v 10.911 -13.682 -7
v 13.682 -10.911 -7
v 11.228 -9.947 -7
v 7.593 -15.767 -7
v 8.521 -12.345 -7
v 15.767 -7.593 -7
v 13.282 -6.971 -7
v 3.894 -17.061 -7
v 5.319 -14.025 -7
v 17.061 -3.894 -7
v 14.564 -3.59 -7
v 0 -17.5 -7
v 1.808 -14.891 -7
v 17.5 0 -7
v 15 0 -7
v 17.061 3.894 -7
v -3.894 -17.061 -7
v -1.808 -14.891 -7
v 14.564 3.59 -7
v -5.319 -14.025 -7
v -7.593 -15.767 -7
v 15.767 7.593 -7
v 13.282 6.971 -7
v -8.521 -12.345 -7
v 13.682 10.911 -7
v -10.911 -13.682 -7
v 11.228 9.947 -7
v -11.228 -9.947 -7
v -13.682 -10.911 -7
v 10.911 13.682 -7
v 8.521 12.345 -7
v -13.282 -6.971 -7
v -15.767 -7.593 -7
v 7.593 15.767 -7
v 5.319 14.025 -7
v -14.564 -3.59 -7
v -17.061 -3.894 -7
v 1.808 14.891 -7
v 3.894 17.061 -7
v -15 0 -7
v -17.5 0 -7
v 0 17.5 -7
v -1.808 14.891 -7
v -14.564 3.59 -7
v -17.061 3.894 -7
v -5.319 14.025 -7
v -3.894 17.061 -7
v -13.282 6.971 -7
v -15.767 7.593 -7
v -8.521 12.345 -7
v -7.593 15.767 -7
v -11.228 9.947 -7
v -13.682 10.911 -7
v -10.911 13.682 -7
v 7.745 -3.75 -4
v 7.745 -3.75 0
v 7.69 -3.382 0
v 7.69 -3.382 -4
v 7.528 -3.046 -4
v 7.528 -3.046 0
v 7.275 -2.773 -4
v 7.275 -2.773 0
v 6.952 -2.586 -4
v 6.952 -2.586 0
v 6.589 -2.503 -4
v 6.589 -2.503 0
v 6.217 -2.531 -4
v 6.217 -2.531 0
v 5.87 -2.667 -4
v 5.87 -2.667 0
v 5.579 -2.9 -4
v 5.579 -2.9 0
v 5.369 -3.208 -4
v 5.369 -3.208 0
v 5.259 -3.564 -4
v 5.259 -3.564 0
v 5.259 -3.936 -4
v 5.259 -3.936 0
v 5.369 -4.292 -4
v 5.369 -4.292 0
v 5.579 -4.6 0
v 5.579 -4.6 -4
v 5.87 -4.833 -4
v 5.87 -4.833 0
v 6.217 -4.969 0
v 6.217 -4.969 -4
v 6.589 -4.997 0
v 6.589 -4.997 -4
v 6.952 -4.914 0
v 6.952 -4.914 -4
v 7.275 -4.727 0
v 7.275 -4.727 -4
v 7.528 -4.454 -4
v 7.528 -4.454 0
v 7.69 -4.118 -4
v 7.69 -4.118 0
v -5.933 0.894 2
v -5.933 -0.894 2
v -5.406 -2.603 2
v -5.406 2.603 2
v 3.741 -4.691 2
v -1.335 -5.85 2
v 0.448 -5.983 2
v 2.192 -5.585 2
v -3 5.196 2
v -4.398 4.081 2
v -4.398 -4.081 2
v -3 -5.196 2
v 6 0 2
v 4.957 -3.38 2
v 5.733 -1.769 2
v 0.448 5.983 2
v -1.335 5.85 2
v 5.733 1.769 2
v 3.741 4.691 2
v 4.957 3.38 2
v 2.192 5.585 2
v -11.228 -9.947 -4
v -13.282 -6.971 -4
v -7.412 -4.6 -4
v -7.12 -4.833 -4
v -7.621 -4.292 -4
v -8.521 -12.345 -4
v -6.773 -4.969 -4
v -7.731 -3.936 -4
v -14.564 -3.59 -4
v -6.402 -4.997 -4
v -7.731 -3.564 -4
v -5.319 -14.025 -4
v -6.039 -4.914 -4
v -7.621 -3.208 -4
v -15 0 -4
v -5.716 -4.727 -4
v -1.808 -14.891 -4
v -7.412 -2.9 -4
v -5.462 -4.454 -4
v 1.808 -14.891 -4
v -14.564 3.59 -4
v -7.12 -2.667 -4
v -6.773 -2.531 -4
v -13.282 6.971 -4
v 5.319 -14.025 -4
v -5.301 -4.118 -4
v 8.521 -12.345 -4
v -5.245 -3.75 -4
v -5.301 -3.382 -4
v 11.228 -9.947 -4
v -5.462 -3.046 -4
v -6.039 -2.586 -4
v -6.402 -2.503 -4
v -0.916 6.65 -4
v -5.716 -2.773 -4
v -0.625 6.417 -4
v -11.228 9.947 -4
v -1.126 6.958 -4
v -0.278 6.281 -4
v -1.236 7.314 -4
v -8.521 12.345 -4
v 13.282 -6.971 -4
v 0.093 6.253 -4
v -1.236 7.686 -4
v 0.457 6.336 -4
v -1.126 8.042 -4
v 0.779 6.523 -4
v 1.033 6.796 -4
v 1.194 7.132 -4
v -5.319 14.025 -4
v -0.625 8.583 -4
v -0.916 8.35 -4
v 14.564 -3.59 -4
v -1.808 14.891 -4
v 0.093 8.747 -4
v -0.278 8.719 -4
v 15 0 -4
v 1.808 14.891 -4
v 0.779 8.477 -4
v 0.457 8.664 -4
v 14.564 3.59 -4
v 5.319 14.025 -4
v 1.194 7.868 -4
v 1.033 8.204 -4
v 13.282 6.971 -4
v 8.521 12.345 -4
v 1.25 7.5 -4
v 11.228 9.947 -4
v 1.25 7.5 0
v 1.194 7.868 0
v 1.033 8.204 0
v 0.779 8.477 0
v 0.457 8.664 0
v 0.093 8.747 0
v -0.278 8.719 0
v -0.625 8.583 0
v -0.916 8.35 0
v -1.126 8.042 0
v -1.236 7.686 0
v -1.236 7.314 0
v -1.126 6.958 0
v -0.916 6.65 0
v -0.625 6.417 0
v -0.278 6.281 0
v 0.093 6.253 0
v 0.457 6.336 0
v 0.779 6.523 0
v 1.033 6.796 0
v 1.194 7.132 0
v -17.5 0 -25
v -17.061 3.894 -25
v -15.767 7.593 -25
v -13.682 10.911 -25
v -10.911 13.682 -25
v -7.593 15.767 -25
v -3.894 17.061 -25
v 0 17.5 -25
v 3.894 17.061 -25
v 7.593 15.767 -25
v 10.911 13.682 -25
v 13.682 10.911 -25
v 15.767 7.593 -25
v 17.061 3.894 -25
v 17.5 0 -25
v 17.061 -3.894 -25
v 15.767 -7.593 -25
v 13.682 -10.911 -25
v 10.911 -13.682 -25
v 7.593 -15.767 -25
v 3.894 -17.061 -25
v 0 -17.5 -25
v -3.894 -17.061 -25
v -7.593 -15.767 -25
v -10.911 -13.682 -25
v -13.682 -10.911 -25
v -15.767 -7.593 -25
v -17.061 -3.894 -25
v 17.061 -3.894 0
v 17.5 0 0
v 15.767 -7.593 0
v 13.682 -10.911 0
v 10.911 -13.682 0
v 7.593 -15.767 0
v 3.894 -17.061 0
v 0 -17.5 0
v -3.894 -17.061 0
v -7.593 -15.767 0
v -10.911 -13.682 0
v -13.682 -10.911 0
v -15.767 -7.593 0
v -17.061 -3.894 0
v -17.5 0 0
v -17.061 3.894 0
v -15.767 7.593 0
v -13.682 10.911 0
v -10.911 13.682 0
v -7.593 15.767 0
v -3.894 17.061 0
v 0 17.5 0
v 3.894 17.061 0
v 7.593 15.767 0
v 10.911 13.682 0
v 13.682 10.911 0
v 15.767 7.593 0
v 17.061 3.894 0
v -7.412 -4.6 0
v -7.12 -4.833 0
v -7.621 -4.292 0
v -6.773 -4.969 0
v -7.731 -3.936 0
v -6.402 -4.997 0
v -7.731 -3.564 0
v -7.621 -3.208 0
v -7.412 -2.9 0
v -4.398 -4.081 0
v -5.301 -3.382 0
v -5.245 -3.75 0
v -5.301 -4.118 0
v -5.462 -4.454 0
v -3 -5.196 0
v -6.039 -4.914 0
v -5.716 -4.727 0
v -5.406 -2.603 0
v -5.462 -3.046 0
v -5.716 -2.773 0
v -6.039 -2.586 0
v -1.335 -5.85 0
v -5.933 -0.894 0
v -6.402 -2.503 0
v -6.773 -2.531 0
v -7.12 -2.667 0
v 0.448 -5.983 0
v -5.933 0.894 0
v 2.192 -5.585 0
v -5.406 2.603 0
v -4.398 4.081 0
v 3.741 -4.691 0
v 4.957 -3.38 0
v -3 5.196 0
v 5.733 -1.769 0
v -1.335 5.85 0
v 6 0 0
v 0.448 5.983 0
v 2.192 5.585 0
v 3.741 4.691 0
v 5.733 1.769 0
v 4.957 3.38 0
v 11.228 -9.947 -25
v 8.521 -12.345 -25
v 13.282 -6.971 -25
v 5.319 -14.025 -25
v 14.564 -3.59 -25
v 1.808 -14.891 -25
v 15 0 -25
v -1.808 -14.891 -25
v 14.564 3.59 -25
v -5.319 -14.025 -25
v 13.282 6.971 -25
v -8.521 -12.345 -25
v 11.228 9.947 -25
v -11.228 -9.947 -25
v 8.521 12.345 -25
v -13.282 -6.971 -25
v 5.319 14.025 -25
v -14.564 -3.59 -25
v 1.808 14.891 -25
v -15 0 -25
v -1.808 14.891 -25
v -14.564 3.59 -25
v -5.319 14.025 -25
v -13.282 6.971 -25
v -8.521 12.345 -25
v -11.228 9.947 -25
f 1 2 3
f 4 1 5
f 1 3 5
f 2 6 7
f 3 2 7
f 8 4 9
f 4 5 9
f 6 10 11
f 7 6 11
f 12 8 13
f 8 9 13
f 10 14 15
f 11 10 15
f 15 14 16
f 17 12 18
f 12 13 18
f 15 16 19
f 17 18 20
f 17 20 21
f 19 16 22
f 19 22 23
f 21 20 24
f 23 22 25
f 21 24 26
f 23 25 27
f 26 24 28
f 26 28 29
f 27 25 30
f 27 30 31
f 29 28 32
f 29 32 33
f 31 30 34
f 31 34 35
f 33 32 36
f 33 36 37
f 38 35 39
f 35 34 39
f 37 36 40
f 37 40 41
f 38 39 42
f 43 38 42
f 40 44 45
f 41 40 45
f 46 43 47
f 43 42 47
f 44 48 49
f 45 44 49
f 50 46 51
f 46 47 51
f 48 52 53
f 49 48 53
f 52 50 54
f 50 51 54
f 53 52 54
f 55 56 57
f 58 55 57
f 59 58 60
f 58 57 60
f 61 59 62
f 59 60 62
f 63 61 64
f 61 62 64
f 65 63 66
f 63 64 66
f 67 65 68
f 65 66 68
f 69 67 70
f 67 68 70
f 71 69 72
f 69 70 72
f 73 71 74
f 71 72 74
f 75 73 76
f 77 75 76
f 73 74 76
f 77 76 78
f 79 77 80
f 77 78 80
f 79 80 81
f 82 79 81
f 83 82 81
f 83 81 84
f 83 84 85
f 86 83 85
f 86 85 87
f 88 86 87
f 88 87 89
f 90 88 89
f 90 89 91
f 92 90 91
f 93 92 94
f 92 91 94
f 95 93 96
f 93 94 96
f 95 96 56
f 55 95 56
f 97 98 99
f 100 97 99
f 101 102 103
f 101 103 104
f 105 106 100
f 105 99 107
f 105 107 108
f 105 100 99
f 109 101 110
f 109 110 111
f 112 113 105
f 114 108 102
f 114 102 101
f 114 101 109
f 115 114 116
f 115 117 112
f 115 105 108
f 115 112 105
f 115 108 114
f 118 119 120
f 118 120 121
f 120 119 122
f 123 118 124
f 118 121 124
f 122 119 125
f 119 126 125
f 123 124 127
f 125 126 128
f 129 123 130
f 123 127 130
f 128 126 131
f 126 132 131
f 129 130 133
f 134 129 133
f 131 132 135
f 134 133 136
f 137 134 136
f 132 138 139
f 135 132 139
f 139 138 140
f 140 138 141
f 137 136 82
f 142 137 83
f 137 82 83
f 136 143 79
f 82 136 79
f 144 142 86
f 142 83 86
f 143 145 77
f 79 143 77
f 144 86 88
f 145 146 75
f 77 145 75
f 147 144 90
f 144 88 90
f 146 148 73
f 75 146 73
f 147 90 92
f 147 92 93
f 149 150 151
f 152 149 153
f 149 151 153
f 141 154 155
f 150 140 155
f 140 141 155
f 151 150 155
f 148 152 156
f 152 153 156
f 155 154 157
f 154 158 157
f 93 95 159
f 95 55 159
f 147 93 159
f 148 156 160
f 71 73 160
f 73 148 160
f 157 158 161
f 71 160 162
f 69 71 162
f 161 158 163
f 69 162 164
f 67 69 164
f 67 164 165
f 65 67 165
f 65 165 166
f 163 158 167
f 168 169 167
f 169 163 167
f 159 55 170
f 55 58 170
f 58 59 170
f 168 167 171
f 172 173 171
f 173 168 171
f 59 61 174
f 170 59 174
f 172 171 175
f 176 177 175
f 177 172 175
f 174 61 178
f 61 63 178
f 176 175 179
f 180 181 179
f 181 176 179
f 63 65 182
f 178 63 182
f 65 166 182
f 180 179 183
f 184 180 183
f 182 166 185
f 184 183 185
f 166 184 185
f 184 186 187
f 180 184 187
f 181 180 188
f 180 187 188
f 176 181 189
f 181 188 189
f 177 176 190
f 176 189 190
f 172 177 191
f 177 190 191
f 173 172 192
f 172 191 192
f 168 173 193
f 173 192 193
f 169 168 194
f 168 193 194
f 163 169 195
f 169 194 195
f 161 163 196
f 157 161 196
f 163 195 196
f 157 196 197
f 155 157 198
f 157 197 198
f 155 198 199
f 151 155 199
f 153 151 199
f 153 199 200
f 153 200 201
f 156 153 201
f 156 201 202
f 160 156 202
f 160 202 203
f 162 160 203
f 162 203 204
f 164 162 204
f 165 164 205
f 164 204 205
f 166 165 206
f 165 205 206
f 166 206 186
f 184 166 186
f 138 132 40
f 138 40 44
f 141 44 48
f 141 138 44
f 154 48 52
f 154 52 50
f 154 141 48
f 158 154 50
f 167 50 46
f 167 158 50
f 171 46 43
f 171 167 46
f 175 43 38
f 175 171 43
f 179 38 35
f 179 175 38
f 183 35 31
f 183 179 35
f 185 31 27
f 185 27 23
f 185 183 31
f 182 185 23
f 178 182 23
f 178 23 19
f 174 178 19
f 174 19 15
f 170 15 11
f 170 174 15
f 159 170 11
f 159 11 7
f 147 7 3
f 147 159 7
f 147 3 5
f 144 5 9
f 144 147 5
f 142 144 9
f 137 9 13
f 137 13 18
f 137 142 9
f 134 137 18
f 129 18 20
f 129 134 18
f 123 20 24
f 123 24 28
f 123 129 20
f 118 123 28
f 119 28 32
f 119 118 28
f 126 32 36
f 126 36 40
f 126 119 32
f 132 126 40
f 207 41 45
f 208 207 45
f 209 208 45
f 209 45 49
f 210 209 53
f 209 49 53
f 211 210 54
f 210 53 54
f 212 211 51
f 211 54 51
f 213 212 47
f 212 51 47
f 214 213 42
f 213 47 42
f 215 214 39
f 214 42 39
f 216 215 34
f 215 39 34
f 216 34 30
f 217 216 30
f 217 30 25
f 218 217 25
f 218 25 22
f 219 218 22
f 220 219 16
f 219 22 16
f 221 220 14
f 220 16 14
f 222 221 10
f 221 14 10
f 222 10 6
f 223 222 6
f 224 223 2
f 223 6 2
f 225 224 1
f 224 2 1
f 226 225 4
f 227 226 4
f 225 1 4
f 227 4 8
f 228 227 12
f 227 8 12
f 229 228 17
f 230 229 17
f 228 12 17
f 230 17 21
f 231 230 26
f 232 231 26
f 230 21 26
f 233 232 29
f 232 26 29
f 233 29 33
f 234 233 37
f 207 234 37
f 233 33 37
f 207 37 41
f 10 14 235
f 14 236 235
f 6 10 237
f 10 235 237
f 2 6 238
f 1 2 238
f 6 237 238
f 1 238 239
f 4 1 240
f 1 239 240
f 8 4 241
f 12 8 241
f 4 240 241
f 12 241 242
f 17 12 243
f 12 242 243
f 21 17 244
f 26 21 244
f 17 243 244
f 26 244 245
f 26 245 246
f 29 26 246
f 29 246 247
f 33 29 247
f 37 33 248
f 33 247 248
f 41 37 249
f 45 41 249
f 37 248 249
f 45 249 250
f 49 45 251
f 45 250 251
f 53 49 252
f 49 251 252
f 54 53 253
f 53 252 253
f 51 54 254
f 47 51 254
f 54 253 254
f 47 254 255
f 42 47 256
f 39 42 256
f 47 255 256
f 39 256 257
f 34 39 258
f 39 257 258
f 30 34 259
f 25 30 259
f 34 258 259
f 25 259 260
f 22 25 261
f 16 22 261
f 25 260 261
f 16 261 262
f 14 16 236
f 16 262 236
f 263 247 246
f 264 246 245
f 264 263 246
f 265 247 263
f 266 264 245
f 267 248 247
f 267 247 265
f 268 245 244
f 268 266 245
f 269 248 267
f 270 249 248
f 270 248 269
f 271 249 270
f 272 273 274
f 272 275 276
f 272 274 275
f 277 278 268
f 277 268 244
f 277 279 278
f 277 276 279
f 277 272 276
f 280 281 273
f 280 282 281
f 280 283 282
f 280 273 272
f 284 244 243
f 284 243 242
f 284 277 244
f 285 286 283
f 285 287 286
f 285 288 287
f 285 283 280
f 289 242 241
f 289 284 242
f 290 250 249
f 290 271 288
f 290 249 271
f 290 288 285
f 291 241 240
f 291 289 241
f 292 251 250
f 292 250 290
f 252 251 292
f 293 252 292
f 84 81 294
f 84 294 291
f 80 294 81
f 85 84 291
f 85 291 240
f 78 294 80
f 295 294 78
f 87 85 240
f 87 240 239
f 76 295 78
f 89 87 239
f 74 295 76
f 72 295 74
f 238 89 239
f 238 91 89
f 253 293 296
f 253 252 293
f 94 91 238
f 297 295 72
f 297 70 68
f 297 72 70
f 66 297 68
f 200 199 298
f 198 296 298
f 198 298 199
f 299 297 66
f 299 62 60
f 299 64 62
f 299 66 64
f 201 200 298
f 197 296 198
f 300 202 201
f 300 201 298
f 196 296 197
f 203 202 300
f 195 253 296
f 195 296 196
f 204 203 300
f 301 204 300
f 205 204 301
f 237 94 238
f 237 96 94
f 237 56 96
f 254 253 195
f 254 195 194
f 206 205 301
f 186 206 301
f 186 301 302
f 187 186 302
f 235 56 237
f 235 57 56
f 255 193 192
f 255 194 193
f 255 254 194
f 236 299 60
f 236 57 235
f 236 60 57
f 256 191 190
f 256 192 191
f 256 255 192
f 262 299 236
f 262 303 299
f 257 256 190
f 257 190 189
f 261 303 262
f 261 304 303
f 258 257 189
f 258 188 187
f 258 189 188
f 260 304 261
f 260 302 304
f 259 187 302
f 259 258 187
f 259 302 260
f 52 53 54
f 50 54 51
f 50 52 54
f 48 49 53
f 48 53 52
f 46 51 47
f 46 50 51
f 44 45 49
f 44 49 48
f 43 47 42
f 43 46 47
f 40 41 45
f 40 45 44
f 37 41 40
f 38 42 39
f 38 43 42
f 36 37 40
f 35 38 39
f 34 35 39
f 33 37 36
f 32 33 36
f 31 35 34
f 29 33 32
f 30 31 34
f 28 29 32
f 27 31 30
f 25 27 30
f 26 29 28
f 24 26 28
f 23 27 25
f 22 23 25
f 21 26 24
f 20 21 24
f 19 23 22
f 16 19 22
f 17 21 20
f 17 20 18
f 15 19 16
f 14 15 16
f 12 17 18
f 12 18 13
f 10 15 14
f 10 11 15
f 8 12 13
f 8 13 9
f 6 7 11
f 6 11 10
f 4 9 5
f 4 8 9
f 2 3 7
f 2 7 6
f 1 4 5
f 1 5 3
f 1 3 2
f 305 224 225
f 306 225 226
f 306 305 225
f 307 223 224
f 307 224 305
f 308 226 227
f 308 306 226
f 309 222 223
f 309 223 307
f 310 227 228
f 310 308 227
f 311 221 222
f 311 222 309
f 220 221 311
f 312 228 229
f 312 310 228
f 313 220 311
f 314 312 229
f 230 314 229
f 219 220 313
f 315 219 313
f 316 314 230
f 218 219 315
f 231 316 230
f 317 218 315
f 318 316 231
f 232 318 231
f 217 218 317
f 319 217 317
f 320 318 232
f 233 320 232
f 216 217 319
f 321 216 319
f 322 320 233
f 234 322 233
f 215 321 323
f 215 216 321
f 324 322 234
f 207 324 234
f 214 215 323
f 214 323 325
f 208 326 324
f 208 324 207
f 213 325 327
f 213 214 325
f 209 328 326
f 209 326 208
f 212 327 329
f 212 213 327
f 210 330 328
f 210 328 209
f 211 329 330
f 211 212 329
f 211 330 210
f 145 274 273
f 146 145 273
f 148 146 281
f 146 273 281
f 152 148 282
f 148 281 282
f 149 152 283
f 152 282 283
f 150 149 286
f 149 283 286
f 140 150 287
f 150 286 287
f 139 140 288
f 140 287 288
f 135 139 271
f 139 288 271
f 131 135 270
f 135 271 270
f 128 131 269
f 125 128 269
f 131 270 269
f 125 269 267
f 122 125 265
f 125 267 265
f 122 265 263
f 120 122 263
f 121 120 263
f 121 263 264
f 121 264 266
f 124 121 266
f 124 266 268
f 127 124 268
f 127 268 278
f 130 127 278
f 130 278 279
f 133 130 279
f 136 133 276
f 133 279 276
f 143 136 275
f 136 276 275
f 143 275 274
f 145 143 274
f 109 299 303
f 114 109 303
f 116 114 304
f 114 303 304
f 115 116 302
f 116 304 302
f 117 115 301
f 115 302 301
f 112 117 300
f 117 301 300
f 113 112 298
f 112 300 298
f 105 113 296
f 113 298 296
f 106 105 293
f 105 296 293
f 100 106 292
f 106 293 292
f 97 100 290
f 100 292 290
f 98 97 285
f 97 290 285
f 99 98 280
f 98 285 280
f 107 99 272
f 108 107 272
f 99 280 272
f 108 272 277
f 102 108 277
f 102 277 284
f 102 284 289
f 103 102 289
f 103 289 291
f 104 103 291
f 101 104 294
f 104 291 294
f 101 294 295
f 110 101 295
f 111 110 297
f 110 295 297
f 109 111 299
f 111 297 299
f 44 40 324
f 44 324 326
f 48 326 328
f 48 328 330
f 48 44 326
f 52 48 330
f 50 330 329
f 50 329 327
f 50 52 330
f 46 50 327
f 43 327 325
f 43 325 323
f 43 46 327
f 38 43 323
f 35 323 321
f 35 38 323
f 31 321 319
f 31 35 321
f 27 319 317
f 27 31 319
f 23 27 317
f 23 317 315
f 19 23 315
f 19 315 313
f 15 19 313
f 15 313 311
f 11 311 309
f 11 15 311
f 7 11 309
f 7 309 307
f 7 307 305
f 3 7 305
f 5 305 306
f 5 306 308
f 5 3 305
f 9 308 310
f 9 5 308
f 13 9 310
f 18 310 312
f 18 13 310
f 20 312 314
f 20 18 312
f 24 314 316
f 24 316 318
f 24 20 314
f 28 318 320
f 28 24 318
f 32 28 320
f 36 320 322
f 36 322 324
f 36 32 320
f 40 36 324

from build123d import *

# Parameters (mm, degrees)
SKETCH1_R           = 17.5
SKETCH1_R_2         = 1.25
BOSS_EXTRUDE1_DEPTH = 4
SKETCH2_R           = 17.5
SKETCH2_R_2         = 15
BOSS_EXTRUDE2_DEPTH = 3
SKETCH3_R           = 6
BOSS_EXTRUDE3_DEPTH = 2
SKETCH4_R           = 17.5
SKETCH4_R_2         = 15
BOSS_EXTRUDE4_DEPTH = 18


with BuildPart() as part:
    # Sketch1 → Boss-Extrude1 (new body)
    with BuildSketch(Plane.XY):
        Circle(SKETCH1_R)
        with Locations((0, 7.5)):
            Circle(SKETCH1_R_2, mode=Mode.SUBTRACT)
        with Locations((6.495190528, -3.75)):
            Circle(SKETCH1_R_2, mode=Mode.SUBTRACT)
        with Locations((-6.495190528, -3.75)):
            Circle(SKETCH1_R_2, mode=Mode.SUBTRACT)
    extrude(amount=-BOSS_EXTRUDE1_DEPTH)

    # Sketch2 → Boss-Extrude2 (add)
    with BuildSketch(Plane(origin=(0, 0, -4), x_dir=(-1, 0, 0), z_dir=(0, 0, -1))):
        with Locations(Location((0, 0, 0), (0, 0, 180))):
            Circle(SKETCH2_R)
        Circle(SKETCH2_R_2, mode=Mode.SUBTRACT)
    extrude(amount=BOSS_EXTRUDE2_DEPTH)

    # Sketch3 → Boss-Extrude3 (add)
    with BuildSketch(Plane.XY):
        Circle(SKETCH3_R)
    extrude(amount=BOSS_EXTRUDE3_DEPTH)


with BuildPart() as body_2:
    # Sketch4 → Boss-Extrude4 (new body)
    with BuildSketch(Plane(origin=(0, 0, -7), x_dir=(-1, 0, 0), z_dir=(0, 0, -1))):
        Circle(SKETCH4_R)
        Circle(SKETCH4_R_2, mode=Mode.SUBTRACT)
    extrude(amount=BOSS_EXTRUDE4_DEPTH)


solid = Compound([part.part, body_2.part])
